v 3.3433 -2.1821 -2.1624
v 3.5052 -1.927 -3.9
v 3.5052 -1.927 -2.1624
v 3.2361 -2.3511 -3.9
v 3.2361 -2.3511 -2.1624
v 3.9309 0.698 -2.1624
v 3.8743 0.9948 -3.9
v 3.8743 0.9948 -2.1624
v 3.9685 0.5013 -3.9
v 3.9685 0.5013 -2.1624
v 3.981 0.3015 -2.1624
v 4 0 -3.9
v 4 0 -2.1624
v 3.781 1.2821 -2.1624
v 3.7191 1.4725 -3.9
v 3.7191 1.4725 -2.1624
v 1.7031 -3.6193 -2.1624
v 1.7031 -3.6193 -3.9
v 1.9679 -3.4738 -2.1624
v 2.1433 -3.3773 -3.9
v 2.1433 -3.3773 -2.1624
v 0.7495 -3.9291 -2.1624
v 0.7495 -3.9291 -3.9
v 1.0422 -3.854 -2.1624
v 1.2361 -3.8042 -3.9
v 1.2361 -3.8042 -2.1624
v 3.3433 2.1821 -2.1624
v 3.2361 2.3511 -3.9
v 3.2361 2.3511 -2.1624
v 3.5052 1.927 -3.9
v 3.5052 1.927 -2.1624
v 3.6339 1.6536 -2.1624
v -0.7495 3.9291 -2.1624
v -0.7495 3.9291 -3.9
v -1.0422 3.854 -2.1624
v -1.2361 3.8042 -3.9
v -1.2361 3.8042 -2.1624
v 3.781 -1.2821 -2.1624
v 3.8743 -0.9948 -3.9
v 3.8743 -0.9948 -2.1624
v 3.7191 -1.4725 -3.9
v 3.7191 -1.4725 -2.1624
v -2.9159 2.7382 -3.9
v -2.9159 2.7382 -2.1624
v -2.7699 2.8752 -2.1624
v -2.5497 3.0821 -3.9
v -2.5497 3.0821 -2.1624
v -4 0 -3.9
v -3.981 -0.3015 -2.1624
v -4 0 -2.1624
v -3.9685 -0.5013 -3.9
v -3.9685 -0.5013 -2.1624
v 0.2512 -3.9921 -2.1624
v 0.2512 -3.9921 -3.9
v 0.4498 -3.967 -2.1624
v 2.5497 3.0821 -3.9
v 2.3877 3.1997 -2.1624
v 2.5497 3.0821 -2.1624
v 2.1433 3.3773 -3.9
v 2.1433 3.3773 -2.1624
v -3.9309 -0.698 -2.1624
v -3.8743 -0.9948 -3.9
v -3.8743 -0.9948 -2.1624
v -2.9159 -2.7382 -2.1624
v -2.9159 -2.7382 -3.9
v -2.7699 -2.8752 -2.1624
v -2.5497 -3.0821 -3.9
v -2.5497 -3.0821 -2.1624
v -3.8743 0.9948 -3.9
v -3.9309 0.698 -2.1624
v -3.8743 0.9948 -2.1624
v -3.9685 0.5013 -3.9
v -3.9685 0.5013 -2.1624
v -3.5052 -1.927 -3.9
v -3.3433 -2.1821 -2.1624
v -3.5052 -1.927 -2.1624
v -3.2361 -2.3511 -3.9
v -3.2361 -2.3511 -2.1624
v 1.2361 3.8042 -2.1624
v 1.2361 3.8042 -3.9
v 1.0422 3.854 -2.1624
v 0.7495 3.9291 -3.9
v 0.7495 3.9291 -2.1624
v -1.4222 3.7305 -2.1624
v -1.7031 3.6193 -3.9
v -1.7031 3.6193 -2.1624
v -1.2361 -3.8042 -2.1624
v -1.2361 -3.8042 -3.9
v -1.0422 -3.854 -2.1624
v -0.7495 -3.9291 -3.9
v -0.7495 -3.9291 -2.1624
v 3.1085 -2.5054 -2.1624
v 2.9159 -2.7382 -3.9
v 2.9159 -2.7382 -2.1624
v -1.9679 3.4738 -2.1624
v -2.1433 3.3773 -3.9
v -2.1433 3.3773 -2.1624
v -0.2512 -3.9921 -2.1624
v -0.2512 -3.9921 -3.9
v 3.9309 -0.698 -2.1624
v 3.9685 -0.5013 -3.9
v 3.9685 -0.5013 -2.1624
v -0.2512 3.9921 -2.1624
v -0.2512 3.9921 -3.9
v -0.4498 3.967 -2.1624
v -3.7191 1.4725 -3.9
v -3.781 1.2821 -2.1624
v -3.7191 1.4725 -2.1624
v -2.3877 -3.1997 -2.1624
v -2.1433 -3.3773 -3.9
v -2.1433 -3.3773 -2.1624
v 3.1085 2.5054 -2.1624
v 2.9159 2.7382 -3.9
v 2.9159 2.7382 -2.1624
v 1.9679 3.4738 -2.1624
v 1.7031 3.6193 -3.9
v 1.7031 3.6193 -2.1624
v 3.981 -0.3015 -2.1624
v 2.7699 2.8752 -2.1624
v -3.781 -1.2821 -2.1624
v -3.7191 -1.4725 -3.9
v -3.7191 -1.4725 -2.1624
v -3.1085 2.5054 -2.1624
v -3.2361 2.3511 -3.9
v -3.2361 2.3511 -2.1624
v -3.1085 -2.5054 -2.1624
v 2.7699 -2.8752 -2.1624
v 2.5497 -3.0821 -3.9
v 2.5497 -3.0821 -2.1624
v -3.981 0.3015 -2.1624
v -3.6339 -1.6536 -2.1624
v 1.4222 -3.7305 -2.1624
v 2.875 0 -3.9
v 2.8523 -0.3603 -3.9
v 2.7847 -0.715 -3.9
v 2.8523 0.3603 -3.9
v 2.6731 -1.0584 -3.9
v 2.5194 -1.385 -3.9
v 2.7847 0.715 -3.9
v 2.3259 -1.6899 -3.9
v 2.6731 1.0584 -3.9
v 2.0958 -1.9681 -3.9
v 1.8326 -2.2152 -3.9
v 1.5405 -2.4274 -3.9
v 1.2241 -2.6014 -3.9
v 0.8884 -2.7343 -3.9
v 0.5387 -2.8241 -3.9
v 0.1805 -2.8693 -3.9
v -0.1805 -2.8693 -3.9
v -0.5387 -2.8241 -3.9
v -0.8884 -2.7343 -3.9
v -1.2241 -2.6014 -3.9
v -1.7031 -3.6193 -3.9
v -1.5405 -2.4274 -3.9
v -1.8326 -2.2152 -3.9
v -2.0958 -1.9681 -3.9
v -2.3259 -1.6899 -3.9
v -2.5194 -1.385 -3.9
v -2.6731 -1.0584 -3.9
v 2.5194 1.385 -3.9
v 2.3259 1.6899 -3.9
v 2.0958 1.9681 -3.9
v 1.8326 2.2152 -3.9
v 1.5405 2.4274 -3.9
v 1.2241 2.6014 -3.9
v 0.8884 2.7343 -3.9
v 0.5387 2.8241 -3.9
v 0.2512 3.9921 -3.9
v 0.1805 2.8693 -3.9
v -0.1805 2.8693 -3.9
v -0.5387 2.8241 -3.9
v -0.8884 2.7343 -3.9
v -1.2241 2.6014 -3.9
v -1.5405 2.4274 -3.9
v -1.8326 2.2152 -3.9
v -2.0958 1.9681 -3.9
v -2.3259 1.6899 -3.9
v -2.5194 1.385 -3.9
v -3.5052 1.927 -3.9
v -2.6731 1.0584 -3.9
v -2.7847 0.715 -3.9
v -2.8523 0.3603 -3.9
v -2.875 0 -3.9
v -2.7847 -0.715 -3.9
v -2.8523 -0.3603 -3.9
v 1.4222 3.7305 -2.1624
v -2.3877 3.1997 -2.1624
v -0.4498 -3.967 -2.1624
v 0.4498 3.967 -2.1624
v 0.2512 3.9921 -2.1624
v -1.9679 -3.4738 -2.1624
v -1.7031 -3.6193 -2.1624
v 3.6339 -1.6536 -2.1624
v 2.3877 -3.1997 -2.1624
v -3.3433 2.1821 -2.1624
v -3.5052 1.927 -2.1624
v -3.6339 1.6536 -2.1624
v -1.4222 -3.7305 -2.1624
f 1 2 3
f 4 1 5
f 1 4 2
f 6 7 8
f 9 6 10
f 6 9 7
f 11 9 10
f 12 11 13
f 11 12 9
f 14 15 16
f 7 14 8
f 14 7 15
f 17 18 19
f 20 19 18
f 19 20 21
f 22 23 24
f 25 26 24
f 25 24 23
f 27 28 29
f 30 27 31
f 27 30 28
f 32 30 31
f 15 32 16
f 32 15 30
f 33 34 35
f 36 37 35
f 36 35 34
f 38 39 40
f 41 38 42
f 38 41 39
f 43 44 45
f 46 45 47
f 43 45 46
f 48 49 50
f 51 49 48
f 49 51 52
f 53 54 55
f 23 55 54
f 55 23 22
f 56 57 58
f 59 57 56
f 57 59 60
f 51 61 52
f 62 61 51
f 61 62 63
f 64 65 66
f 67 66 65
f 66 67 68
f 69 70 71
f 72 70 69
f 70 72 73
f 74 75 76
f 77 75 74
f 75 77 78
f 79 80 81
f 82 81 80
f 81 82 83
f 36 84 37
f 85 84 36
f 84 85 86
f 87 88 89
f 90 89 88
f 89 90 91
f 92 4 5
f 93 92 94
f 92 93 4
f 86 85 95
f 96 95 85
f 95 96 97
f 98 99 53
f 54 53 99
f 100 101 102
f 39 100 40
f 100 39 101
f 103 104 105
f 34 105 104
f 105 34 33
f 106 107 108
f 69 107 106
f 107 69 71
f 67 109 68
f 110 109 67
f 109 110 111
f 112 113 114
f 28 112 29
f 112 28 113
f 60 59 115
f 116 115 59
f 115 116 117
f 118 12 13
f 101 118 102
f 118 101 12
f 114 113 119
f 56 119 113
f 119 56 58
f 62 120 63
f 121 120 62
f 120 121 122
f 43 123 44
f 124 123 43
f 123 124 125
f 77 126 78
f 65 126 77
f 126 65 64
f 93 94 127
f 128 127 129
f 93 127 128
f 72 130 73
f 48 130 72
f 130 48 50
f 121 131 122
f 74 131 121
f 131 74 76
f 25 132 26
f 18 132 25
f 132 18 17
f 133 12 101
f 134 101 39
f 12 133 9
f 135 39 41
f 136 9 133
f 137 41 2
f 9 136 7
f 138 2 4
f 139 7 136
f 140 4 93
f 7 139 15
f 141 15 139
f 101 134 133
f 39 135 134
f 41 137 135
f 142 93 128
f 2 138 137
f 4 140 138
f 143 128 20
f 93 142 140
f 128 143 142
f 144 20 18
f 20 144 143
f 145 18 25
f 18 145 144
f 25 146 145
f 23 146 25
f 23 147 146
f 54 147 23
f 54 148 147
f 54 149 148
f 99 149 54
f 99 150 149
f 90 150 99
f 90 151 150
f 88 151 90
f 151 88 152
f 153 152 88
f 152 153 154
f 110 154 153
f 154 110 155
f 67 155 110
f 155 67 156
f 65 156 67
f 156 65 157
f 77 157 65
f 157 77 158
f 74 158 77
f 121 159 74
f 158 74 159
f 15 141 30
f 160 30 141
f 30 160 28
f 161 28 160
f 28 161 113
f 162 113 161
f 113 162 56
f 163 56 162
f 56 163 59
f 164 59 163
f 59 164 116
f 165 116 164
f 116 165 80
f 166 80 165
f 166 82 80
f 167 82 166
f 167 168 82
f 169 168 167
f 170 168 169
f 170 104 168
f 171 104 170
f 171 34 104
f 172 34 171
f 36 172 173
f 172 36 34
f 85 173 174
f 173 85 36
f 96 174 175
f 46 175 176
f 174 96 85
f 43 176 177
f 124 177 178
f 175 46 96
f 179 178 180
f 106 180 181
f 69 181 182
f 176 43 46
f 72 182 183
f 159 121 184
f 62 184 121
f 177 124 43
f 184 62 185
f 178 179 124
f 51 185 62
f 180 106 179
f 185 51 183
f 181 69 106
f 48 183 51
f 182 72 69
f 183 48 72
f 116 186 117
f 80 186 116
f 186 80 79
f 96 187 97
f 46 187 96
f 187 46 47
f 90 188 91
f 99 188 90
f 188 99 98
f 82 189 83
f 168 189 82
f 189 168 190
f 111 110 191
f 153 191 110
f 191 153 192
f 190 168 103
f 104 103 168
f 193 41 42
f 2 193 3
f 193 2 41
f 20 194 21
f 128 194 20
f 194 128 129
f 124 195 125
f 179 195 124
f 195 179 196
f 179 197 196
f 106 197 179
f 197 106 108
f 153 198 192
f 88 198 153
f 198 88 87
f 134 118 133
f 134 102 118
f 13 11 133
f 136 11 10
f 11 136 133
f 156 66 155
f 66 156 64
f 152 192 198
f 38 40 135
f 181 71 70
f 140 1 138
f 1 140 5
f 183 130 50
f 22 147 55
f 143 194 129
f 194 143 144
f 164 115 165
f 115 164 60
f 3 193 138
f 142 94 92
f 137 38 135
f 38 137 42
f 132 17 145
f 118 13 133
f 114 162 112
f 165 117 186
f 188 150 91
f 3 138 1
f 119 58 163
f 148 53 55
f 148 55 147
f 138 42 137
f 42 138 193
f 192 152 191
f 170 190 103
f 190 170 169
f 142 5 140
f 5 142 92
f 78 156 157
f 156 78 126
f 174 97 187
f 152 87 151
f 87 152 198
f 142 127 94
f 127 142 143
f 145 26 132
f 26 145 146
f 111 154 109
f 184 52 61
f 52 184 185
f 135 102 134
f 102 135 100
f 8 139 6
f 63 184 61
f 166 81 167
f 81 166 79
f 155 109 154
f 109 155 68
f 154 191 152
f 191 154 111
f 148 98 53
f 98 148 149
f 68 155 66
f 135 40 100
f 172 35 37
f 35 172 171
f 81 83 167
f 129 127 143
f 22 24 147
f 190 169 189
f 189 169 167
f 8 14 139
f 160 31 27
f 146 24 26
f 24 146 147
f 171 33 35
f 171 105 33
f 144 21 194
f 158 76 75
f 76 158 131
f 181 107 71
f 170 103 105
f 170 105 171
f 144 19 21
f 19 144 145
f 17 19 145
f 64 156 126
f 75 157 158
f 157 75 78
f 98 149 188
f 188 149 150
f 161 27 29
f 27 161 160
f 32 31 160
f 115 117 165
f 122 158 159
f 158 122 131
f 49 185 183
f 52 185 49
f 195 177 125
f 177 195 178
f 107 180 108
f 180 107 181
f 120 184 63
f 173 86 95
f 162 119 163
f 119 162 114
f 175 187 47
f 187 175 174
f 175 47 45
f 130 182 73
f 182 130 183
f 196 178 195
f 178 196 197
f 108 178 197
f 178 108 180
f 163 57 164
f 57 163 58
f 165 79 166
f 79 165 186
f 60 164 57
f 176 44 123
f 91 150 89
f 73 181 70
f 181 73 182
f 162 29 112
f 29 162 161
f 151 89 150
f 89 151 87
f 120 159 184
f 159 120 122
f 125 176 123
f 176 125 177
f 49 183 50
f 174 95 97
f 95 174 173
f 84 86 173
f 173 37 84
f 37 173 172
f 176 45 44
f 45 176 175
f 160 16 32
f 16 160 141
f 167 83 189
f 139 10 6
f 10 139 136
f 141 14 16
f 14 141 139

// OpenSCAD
$fn = 50;

difference() {
	union() {
		translate(v = [0, 0, -3.9000000000000004]) {
			cylinder(h = 6.9, r = 4.0);
		}
		#translate(v = [0, 0, -6.9]) {
			cylinder(h = 6.9, r = 2.875);
		}
	}
	union() {
		translate(v = [0, 0, 0]) {
			rotate(a = [0, 0, 0]) {
				difference() {
					union() {
						translate(v = [0, 0, -6.9]) {
							cylinder(h = 6.9, r = 2.6);
						}
						translate(v = [0, 0, -3.9]) {
							cylinder(h = 3.9, r1 = 2.875, r2 = 5.4);
						}
						translate(v = [0, 0, -6.9]) {
							cylinder(h = 6.9, r = 2.875);
						}
						translate(v = [0, 0, -6.9]) {
							cylinder(h = 6.9, r = 2.6);
						}
					}
					union();
				}
			}
		}
		#cylinder(h = 3, r = 5.0);
	}
}
